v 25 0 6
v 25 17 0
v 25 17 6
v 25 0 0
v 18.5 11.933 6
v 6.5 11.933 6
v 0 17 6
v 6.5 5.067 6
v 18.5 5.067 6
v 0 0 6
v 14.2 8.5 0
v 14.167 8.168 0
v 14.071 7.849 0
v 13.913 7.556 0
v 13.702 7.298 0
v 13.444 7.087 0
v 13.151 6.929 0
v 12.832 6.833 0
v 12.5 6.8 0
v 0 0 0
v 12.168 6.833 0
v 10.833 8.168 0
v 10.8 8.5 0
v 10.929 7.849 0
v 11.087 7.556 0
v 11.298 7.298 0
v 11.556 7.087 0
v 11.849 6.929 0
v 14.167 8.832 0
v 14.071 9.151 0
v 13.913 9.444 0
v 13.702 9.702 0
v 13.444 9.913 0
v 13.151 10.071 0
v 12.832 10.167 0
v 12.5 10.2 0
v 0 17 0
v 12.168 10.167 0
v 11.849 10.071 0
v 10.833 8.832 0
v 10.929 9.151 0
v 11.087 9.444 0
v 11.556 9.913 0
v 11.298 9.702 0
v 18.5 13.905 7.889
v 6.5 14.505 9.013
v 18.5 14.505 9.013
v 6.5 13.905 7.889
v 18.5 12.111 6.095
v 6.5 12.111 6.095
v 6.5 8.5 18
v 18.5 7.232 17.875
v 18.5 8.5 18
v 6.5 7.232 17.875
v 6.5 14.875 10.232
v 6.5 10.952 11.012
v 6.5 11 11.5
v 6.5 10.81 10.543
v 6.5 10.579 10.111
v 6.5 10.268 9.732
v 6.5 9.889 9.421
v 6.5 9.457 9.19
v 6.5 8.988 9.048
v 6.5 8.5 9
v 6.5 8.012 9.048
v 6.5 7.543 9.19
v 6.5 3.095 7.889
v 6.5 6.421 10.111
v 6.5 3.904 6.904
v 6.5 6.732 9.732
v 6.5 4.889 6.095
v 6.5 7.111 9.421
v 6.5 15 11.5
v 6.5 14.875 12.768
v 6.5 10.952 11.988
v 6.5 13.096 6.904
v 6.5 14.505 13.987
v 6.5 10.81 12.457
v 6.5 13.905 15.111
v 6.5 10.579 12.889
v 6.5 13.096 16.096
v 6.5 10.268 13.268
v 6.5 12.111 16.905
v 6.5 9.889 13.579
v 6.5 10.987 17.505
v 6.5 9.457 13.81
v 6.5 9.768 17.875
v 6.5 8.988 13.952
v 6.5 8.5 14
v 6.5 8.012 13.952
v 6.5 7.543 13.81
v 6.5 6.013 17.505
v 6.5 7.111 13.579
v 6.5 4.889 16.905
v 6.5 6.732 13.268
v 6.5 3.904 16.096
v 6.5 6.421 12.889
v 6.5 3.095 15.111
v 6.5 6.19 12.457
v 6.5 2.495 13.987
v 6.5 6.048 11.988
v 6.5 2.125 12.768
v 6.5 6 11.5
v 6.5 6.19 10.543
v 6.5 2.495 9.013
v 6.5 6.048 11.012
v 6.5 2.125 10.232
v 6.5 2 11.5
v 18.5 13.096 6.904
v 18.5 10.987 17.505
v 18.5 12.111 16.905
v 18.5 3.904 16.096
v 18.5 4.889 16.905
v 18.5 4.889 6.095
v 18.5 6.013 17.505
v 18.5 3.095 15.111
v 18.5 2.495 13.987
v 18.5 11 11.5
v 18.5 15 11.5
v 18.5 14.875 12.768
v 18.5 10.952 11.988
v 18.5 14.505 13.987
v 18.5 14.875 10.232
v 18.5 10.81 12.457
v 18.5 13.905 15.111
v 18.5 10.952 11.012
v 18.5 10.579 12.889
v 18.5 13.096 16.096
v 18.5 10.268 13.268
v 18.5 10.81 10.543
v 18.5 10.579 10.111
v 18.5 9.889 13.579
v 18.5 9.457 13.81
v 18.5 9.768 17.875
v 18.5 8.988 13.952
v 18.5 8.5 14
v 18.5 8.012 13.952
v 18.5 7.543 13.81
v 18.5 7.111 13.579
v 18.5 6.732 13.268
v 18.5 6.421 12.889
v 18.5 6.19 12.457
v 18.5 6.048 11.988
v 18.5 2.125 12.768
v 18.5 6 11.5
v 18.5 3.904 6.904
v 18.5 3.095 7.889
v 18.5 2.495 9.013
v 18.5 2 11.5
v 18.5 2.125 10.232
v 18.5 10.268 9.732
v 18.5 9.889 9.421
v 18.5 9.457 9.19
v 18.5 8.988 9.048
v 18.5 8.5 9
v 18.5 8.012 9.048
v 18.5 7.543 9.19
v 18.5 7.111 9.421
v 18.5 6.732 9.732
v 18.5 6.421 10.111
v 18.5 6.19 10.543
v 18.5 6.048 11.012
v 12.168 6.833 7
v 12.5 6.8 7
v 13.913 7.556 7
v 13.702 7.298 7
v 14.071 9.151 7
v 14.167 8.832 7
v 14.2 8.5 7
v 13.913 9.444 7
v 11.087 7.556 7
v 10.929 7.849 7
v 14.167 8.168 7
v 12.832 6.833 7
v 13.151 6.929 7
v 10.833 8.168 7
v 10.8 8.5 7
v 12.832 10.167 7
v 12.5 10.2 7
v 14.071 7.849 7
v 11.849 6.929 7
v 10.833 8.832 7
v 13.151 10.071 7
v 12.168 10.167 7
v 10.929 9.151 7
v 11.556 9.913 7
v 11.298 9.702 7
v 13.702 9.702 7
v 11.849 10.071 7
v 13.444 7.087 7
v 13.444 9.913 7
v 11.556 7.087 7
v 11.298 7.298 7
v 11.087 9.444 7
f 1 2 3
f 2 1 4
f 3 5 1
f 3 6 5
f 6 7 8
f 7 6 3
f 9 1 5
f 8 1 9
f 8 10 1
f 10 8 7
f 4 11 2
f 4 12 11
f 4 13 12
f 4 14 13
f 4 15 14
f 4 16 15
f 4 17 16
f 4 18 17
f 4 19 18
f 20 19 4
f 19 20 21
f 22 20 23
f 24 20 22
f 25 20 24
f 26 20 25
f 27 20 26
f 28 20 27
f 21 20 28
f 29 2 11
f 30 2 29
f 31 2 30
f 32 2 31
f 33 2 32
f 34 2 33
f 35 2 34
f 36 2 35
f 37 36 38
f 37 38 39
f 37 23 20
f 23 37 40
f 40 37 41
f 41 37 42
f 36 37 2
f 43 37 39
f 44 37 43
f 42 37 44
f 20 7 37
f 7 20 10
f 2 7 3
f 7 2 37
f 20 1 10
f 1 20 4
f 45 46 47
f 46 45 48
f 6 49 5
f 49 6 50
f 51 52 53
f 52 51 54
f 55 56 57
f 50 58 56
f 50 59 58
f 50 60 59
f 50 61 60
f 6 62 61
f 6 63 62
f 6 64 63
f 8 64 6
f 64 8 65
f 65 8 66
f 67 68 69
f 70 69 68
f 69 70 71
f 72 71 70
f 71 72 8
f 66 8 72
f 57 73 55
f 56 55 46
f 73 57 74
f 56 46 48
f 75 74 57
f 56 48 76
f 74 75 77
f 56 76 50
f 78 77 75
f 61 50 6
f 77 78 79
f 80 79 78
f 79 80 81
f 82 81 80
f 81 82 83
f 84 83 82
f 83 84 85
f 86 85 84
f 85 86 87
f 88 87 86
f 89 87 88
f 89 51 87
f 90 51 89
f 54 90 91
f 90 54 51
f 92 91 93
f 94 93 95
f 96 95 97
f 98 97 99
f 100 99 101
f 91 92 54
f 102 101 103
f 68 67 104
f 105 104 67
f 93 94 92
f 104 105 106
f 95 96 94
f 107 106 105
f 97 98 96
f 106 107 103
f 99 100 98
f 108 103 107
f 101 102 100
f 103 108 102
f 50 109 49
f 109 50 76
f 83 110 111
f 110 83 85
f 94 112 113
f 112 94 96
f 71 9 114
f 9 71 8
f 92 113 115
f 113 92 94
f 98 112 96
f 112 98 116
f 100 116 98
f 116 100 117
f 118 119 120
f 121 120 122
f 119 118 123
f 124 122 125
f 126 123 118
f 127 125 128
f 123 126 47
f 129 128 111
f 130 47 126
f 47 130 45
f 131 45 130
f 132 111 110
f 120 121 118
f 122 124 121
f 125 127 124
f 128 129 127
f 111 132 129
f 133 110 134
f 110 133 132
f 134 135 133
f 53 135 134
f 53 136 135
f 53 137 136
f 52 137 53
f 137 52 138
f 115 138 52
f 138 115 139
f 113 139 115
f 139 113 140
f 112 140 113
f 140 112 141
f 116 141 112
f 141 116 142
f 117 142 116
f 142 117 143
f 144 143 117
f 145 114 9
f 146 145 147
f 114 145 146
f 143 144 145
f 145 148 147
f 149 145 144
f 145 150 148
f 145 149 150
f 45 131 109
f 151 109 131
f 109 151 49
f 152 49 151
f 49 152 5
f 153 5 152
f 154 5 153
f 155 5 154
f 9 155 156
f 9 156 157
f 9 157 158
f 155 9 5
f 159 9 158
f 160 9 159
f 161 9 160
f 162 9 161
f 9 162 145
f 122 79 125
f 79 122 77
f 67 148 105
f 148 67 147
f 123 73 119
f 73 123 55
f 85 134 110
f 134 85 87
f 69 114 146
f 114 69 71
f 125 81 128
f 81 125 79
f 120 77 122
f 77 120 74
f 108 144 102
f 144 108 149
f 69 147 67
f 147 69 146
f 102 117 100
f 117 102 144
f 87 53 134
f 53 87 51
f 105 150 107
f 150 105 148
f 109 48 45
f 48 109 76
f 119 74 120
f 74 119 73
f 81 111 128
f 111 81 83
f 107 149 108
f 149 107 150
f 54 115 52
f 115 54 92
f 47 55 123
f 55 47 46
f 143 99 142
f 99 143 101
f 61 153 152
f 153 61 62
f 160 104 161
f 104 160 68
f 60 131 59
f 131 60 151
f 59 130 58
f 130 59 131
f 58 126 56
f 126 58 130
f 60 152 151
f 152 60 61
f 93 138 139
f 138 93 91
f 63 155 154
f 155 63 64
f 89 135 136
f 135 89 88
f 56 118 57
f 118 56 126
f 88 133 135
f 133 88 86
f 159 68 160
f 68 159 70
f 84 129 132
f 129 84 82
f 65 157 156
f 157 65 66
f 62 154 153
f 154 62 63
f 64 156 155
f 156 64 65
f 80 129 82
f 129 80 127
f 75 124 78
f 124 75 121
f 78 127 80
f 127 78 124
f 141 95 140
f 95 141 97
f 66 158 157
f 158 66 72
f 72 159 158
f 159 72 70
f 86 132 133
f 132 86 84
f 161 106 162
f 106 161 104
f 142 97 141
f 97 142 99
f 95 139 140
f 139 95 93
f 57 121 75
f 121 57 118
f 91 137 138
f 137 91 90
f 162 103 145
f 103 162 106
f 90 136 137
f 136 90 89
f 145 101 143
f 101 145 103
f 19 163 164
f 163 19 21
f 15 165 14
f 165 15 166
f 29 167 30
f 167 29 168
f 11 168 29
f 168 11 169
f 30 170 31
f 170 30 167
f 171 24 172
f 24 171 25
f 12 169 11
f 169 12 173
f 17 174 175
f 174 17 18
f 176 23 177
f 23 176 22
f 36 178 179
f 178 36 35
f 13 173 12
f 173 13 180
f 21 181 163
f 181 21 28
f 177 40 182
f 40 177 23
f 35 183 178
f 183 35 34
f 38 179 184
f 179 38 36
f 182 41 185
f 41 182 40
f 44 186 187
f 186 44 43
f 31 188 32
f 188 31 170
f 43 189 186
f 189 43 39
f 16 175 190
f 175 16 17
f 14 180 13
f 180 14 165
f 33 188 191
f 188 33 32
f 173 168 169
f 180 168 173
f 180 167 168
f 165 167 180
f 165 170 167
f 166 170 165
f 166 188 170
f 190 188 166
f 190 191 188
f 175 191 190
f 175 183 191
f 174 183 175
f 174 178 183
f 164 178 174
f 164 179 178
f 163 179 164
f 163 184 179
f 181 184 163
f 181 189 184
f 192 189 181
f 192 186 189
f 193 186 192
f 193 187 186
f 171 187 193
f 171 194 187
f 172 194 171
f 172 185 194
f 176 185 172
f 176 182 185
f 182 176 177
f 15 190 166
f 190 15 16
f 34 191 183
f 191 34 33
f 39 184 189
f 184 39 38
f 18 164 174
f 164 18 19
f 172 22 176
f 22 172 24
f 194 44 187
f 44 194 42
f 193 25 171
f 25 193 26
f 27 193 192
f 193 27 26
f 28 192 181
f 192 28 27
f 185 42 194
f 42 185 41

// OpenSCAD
$fn = 32;

// ----------------------------------------------------------------------
// Cable clip: cable 5 mm, clamp 13 mm, base 25 mm
// ----------------------------------------------------------------------

// --- parameters (mm) ---
base_w = 25;              // base length, X
base_d = 17;              // base width, Y
base_t = 6;               // base thickness
clamp_d = 13;             // clamp outside diameter
wall_t = 4;               // clamp wall
cable_d = 5;              // cable opening
ring_w = 12;              // clamp width along the cable
screw_d = 3.4;            // screw clearance
sink = 1;                 // overlap of the clamp into the base

module base() {
  cube([base_w, base_d, base_t]);
}

module clamp() {
  translate([base_w / 2, base_d / 2, base_t + clamp_d / 2 - sink]) rotate([0, 90, 0])
    cylinder(h = ring_w, d = clamp_d, center = true);
}

difference() {
  union() {
    base();
    clamp();
  }
  translate([base_w / 2, base_d / 2, base_t + clamp_d / 2 - sink]) rotate([0, 90, 0]) translate([0, 0, -ring_w / 2 - 1]) cylinder(h = ring_w + 2, d = cable_d);
  translate([12.5, base_d / 2, -1]) cylinder(h = base_t + 2, d = screw_d);
}
